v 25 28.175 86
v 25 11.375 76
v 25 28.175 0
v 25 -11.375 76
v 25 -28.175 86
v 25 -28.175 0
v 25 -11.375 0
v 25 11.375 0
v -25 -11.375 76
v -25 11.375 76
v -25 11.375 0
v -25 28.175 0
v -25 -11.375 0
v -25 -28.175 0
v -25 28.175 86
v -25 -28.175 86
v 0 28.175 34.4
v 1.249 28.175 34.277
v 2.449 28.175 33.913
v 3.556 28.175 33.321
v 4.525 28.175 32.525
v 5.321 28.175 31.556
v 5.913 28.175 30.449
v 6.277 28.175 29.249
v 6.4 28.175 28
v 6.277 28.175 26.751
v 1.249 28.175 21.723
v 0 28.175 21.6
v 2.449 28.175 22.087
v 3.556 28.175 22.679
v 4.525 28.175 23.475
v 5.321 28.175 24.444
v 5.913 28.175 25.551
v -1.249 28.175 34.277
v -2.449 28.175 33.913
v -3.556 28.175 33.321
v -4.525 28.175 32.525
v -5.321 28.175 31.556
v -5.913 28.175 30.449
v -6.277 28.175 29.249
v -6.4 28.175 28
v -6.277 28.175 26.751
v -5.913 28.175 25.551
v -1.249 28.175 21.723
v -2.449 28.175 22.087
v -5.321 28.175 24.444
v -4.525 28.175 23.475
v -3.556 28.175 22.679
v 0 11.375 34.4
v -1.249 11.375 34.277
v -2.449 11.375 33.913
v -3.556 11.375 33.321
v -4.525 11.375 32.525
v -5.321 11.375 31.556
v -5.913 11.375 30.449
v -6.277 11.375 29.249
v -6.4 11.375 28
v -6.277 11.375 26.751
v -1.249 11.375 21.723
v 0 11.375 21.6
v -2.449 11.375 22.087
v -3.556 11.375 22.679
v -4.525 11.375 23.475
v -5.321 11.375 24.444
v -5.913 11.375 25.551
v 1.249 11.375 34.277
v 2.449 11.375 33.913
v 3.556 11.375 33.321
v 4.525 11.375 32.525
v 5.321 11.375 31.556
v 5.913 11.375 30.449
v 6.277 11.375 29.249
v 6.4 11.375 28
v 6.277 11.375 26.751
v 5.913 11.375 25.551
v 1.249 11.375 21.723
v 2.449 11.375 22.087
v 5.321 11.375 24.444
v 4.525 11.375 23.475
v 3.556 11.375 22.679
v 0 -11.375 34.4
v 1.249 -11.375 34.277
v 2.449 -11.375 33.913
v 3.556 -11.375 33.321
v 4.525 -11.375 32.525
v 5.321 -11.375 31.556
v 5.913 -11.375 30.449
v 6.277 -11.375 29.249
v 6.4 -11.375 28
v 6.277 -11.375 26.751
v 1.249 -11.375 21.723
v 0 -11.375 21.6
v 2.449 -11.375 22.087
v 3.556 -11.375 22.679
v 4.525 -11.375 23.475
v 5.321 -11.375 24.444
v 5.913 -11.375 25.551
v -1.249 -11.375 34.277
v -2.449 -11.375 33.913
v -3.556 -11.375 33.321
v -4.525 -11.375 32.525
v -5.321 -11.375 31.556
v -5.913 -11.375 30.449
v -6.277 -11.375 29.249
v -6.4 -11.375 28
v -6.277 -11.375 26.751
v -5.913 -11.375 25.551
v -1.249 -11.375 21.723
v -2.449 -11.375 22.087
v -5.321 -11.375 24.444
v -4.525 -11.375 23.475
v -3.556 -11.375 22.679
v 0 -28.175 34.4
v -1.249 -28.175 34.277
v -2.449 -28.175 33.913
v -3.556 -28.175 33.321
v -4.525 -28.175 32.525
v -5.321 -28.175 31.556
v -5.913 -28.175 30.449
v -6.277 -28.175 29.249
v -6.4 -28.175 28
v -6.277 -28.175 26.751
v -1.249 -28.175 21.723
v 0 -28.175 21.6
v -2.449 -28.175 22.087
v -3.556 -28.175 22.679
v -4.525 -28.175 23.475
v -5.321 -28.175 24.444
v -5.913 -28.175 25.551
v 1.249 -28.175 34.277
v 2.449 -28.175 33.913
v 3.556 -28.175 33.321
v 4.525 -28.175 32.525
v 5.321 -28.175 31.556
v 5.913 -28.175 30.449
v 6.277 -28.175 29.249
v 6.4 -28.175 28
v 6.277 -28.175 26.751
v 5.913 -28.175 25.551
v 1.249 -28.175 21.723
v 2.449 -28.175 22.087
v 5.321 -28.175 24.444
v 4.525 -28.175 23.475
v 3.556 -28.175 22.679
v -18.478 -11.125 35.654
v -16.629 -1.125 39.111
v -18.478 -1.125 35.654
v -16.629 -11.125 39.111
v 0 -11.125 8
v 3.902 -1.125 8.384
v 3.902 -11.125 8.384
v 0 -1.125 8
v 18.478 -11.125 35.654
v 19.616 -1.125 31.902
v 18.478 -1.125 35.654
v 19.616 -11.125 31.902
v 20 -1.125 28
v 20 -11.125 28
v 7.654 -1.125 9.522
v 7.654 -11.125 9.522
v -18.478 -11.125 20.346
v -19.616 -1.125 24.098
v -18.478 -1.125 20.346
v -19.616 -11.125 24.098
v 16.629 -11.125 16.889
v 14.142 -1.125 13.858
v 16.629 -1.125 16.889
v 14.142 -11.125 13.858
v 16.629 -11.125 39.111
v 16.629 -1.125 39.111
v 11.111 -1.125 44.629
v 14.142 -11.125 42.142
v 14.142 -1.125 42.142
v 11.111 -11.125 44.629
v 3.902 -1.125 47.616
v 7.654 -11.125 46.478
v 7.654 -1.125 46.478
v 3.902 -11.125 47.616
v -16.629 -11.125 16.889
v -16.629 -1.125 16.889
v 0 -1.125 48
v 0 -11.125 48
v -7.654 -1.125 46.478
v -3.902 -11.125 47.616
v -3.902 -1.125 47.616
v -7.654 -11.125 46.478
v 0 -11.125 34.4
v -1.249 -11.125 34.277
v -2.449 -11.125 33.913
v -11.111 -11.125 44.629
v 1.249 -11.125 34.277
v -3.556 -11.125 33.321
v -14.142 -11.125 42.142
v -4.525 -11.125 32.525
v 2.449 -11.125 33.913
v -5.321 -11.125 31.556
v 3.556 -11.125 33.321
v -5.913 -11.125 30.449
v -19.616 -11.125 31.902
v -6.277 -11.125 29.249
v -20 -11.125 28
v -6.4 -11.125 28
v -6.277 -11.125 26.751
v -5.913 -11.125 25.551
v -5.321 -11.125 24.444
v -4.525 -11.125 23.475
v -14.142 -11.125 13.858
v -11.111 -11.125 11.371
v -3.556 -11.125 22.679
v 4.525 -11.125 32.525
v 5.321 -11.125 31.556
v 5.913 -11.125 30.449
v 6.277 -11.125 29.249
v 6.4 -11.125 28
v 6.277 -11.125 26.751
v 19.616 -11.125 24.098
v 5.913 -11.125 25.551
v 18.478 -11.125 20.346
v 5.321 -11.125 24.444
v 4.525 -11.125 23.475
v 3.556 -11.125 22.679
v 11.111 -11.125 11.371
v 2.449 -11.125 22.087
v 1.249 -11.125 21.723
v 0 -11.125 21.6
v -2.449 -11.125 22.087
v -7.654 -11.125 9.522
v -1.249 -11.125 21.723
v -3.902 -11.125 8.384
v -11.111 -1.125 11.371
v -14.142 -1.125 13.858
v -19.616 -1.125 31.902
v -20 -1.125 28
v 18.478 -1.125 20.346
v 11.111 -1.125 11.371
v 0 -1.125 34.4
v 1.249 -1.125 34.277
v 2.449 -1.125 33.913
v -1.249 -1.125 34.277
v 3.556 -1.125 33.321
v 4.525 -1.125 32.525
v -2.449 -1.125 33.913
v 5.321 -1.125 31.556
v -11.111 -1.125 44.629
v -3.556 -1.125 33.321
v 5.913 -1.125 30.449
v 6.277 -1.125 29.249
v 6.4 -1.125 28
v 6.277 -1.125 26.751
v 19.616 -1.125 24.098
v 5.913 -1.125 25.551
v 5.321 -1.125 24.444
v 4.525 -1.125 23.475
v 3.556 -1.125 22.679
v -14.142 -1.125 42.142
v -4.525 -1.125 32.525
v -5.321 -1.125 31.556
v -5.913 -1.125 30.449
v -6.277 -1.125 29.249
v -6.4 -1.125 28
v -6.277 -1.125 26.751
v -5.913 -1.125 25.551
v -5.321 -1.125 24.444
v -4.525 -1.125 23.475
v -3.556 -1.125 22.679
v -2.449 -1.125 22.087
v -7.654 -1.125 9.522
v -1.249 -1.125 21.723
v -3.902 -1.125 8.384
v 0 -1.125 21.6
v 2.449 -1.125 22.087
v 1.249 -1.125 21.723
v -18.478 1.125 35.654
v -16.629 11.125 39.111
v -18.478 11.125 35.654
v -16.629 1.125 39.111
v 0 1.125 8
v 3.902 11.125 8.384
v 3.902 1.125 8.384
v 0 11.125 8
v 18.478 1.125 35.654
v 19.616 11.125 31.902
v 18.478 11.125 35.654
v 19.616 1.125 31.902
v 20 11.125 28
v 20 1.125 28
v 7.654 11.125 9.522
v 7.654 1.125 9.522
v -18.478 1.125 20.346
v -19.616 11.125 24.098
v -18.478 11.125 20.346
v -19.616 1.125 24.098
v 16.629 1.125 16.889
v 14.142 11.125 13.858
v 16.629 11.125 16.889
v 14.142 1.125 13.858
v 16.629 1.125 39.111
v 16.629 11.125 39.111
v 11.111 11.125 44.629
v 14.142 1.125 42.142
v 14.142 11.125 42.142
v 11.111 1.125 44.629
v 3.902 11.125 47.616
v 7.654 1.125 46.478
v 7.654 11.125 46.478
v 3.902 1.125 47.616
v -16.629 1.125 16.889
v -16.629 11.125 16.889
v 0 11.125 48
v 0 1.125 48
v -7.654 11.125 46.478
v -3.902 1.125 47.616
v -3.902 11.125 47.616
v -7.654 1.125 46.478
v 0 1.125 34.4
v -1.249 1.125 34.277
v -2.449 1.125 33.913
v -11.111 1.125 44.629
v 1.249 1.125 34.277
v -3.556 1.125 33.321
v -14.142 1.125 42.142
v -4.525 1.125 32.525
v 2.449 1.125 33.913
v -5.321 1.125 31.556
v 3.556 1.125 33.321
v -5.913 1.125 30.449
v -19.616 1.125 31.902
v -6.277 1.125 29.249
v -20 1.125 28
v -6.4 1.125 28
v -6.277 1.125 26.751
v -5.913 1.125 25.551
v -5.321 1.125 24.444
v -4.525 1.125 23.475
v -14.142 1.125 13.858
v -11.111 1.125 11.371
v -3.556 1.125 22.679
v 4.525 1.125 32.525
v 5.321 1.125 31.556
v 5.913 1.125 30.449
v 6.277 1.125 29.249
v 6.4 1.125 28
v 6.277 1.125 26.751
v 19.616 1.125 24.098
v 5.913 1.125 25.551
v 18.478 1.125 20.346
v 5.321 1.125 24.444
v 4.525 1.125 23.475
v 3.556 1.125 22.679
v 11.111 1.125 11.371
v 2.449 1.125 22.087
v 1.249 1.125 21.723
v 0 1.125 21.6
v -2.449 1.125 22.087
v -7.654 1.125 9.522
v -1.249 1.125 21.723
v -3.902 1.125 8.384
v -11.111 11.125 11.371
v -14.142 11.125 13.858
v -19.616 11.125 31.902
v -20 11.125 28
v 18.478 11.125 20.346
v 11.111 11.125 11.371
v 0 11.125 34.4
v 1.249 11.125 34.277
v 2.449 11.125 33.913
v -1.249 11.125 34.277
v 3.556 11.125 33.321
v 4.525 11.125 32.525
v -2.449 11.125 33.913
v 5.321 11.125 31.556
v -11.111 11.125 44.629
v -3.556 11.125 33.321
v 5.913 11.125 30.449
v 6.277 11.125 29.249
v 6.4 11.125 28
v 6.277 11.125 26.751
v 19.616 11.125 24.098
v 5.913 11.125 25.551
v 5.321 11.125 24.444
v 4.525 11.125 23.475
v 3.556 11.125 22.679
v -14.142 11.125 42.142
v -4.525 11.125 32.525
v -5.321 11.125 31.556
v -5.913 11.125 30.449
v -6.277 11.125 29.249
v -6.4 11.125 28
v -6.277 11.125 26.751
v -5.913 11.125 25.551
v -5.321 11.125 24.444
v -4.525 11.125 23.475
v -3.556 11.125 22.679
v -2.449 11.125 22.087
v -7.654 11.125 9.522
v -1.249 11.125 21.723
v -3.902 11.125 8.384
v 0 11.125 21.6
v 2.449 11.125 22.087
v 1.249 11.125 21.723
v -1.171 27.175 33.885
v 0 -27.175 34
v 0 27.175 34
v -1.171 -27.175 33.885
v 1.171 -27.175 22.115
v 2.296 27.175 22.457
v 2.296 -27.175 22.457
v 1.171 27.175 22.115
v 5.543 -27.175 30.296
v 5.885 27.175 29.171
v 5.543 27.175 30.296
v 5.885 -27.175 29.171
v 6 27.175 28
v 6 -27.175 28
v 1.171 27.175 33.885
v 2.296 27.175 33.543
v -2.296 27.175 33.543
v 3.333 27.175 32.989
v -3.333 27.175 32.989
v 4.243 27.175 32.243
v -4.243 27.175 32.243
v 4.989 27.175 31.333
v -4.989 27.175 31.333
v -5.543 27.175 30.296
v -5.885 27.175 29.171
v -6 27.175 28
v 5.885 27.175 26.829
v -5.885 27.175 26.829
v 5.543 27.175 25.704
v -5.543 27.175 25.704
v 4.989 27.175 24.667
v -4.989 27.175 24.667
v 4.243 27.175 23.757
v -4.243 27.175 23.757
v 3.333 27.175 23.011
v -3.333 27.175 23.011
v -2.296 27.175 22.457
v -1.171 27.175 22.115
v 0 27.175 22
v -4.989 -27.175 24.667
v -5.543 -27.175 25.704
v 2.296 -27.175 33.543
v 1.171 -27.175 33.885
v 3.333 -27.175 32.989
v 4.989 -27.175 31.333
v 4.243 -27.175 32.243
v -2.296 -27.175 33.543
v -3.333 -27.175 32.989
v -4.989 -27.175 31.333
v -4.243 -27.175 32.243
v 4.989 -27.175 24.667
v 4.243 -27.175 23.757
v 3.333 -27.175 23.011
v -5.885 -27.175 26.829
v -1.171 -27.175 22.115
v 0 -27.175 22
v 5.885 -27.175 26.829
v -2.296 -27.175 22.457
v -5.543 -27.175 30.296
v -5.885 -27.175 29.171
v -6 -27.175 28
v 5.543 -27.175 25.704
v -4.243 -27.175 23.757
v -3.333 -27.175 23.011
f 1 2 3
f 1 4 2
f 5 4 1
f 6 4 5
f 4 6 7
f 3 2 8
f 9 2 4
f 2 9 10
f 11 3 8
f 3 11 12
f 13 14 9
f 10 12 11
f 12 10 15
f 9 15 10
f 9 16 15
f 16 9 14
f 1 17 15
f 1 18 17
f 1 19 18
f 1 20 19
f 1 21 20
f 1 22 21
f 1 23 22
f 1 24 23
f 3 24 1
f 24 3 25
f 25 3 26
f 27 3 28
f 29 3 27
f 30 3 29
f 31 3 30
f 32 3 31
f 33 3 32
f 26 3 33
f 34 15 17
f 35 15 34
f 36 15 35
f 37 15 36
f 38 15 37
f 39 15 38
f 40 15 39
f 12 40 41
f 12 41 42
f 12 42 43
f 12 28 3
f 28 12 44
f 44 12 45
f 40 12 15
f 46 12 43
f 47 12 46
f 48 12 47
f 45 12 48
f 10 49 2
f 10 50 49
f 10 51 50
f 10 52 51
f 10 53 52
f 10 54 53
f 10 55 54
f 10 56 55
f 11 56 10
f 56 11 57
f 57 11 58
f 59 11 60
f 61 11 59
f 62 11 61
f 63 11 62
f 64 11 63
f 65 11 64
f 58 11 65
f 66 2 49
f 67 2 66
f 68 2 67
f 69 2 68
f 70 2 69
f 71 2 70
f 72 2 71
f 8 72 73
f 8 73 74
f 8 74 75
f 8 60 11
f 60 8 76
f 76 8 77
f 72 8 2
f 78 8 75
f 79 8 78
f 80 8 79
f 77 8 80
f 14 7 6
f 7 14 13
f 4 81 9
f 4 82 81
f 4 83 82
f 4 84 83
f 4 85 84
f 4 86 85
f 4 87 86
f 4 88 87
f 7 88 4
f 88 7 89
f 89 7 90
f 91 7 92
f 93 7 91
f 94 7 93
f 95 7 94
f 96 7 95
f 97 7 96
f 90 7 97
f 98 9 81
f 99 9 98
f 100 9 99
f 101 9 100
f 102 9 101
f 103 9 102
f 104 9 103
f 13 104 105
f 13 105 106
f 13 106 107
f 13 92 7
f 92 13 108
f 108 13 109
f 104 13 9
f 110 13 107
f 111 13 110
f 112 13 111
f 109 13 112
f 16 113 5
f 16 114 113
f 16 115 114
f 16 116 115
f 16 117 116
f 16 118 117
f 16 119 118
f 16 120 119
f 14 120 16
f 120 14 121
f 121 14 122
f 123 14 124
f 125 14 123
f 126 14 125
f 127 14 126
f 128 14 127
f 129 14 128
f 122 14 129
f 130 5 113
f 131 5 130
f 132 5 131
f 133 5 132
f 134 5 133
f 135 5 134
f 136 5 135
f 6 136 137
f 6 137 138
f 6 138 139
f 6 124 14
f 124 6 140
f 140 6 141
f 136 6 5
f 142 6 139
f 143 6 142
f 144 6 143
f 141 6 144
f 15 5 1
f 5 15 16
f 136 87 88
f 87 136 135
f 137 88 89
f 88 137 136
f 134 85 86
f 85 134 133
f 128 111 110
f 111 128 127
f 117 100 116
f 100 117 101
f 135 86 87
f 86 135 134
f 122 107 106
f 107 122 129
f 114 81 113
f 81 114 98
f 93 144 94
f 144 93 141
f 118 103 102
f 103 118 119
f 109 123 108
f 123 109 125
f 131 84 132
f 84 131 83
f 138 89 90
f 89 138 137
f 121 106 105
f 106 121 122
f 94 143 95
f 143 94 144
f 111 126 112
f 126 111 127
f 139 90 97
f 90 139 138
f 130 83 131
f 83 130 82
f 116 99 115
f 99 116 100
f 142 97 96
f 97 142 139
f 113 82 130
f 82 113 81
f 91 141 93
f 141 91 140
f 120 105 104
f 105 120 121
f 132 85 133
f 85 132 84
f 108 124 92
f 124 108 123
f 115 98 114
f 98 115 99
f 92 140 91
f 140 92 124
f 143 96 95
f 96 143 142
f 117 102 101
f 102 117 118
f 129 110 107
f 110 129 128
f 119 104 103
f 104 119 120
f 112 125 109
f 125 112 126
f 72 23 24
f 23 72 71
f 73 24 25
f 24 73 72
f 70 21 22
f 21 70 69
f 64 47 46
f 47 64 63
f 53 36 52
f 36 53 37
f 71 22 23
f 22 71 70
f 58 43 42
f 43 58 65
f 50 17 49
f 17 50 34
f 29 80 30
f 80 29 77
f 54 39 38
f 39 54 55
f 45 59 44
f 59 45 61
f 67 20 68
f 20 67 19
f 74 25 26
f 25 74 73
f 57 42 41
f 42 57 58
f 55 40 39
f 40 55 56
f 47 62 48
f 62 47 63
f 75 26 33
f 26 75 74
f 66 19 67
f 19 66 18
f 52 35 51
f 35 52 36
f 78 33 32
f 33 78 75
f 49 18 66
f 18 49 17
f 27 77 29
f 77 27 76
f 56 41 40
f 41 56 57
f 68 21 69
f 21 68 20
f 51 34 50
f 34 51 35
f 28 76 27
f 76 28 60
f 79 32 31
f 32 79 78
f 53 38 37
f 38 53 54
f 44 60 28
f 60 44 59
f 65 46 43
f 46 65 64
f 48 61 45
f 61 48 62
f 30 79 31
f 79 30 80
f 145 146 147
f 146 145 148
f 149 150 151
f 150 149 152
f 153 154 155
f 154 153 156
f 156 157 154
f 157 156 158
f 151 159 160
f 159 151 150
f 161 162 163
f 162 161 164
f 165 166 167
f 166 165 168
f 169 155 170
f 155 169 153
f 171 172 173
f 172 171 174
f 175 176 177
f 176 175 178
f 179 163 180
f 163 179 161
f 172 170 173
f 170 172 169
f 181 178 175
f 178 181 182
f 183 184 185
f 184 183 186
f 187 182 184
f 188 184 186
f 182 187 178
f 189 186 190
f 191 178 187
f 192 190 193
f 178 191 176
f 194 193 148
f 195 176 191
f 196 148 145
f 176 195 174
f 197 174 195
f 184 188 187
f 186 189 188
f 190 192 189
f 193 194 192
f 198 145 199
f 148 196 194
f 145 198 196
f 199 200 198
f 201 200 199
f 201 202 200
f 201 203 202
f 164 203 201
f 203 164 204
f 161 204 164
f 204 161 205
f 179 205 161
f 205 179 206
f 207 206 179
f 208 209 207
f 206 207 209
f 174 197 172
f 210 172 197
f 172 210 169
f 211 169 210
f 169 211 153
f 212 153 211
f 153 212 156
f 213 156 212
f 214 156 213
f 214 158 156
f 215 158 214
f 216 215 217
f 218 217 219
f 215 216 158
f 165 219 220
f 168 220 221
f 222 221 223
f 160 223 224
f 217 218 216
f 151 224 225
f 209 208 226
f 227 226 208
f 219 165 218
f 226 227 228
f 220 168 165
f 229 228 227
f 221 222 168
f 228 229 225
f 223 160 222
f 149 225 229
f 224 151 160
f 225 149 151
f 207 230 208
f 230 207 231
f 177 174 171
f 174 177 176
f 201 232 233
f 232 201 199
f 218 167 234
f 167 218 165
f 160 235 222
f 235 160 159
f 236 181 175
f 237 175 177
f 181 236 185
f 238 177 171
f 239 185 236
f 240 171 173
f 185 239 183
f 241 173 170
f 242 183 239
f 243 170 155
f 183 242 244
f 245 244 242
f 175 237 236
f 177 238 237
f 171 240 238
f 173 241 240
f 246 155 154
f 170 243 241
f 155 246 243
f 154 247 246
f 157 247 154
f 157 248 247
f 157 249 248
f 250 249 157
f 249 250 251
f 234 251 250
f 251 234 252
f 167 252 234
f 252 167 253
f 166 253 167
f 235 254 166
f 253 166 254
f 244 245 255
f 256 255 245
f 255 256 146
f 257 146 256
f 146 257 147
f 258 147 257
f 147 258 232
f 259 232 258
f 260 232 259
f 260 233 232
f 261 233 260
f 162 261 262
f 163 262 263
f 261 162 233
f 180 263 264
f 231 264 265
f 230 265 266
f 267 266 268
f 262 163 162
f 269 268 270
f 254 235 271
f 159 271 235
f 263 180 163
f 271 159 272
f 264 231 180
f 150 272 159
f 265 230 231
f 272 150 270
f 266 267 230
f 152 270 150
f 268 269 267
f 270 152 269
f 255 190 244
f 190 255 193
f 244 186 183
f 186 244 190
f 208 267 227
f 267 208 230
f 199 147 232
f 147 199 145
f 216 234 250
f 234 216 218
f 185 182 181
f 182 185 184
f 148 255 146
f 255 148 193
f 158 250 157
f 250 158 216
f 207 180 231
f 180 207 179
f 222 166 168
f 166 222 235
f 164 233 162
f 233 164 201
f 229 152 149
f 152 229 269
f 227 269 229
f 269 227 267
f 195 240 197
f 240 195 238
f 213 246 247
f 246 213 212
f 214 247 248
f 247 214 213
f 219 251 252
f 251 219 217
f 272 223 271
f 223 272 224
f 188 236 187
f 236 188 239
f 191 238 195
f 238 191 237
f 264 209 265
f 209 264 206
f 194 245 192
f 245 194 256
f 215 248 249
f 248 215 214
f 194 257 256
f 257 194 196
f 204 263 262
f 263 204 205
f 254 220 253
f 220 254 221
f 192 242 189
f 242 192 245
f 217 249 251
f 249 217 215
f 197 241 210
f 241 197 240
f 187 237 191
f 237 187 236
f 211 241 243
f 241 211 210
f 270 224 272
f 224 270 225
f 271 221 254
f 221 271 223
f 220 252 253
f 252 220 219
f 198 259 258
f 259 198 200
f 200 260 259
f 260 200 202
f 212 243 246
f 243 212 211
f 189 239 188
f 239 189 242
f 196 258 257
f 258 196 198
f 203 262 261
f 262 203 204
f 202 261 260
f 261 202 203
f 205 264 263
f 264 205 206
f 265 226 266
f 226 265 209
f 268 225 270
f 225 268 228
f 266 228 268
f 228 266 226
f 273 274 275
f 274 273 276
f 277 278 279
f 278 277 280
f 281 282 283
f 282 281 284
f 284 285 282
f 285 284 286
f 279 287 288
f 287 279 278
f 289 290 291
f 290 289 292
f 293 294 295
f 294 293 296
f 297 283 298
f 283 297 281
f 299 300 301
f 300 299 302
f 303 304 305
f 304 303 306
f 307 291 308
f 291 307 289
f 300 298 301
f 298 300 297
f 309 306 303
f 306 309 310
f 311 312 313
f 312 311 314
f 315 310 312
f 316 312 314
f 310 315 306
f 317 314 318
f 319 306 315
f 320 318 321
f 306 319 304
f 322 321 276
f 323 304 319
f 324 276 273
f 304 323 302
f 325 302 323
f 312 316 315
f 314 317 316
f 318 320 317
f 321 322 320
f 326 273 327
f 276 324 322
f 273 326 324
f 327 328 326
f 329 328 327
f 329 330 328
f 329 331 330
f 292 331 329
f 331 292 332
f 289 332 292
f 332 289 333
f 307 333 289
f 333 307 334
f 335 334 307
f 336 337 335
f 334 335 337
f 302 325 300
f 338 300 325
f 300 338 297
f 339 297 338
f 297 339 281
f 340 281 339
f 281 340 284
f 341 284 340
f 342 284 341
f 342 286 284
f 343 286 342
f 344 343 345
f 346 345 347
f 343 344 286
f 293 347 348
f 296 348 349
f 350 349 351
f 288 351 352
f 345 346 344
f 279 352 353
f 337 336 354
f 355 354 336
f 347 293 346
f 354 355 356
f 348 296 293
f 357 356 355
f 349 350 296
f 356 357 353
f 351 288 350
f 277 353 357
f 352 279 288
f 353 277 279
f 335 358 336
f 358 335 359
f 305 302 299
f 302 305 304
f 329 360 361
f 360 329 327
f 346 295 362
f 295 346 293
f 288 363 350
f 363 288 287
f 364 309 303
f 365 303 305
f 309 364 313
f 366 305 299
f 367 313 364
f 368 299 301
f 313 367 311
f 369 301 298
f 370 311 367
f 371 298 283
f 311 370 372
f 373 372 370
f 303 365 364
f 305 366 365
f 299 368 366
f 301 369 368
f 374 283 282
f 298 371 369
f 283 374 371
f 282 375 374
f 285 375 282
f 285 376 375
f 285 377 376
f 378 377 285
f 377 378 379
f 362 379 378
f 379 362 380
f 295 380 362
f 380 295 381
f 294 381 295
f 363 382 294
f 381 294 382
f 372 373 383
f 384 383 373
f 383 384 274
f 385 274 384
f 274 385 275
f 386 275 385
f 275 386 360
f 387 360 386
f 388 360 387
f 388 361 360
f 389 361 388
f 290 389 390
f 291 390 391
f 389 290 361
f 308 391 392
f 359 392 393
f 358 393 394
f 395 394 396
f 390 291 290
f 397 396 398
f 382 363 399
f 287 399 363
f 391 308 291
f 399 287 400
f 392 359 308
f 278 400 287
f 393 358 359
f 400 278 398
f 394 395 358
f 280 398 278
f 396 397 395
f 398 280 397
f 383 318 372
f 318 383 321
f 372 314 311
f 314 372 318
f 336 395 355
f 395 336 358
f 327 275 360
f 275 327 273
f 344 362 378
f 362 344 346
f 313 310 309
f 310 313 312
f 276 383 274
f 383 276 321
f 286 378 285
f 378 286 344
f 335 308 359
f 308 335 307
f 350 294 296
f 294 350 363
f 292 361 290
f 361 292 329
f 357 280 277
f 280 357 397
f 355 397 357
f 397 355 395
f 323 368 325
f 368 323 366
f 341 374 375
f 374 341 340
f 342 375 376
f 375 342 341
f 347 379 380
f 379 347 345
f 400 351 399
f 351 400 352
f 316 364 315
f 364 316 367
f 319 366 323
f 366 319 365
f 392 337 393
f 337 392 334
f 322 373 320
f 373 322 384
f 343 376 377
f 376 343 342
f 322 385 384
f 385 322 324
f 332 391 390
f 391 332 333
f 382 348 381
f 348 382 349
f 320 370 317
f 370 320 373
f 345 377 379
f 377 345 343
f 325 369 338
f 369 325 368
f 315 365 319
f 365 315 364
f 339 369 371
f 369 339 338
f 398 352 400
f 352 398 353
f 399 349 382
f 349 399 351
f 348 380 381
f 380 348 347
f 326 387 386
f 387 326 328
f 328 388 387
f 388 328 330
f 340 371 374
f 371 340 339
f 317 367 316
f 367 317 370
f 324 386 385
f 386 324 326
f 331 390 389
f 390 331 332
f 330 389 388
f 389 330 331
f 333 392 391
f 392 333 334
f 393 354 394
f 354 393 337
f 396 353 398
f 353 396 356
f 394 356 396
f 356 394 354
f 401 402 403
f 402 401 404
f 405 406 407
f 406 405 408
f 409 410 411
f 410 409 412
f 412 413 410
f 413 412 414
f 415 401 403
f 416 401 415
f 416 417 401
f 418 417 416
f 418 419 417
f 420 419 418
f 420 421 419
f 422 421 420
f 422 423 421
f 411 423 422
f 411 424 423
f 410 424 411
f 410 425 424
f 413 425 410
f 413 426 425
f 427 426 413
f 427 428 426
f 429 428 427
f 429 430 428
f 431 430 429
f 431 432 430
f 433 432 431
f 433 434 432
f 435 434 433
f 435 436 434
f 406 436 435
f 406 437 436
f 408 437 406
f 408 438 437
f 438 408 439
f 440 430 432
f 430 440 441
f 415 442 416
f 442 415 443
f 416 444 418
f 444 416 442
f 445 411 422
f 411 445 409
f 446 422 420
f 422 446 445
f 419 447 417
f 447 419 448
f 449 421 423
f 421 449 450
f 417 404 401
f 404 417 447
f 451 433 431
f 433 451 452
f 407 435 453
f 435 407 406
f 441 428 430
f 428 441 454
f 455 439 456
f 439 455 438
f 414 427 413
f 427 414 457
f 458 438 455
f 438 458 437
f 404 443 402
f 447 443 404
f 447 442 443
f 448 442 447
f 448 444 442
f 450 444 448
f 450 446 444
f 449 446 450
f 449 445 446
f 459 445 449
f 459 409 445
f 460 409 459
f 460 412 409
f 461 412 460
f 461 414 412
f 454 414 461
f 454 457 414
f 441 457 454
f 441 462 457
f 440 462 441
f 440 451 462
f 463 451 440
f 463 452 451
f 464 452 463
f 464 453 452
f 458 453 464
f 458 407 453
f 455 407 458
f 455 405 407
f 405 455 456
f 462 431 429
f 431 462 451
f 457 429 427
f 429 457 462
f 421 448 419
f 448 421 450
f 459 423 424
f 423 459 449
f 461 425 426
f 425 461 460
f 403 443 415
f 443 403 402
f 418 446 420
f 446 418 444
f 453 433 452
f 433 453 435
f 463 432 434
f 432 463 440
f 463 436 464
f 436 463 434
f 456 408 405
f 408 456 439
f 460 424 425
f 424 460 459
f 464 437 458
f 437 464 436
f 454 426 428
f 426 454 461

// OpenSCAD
$fn = 32;

// ------------------------------------------------------------------------
// Trolley wheel set: wheels d40, fork 76 mm tall
// Every part is its own module, assembly() places every instance.
// ------------------------------------------------------------------------

// --- part 1 ---
module trolley_fork() {
  difference() {
    union() {
      translate([-25, 11.375, 0]) cube([50, 16.8, 76]);
      translate([-25, -28.175, 0]) cube([50, 16.8, 76]);
      translate([-25, -28.175, 76]) cube([50, 56.35, 10]);
    }
    translate([0, -19.775, 28]) rotate([90, 0, 0]) cylinder(h = 18.8, d = 12.8, center = true);
    translate([0, 19.775, 28]) rotate([90, 0, 0]) cylinder(h = 18.8, d = 12.8, center = true);
  }
}

// --- part 2 ---
module trolley_wheel() {
  difference() {
      translate([0, 0, 0]) cylinder(h = 10, d = 40);
      translate([0, 0, -1]) cylinder(h = 12, d = 12.8);
    }
}

// --- part 3 ---
module trolley_axle() {
  translate([0, 0, -27.175]) cylinder(h = 54.35, d = 12);
}

// --- assembly ---
module assembly() {
  color([0.80, 0.24, 0.20]) translate([0, 0, 0]) rotate([0, 0, 0]) trolley_fork();
  color([0.20, 0.45, 0.75]) translate([0, -1.125, 28]) rotate([90, 0, 0]) trolley_wheel();
  color([0.25, 0.62, 0.32]) translate([0, 11.125, 28]) rotate([90, 0, 0]) trolley_wheel();
  color([0.92, 0.70, 0.18]) translate([0, 0, 28]) rotate([90, 0, 0]) trolley_axle();
}

assembly();
